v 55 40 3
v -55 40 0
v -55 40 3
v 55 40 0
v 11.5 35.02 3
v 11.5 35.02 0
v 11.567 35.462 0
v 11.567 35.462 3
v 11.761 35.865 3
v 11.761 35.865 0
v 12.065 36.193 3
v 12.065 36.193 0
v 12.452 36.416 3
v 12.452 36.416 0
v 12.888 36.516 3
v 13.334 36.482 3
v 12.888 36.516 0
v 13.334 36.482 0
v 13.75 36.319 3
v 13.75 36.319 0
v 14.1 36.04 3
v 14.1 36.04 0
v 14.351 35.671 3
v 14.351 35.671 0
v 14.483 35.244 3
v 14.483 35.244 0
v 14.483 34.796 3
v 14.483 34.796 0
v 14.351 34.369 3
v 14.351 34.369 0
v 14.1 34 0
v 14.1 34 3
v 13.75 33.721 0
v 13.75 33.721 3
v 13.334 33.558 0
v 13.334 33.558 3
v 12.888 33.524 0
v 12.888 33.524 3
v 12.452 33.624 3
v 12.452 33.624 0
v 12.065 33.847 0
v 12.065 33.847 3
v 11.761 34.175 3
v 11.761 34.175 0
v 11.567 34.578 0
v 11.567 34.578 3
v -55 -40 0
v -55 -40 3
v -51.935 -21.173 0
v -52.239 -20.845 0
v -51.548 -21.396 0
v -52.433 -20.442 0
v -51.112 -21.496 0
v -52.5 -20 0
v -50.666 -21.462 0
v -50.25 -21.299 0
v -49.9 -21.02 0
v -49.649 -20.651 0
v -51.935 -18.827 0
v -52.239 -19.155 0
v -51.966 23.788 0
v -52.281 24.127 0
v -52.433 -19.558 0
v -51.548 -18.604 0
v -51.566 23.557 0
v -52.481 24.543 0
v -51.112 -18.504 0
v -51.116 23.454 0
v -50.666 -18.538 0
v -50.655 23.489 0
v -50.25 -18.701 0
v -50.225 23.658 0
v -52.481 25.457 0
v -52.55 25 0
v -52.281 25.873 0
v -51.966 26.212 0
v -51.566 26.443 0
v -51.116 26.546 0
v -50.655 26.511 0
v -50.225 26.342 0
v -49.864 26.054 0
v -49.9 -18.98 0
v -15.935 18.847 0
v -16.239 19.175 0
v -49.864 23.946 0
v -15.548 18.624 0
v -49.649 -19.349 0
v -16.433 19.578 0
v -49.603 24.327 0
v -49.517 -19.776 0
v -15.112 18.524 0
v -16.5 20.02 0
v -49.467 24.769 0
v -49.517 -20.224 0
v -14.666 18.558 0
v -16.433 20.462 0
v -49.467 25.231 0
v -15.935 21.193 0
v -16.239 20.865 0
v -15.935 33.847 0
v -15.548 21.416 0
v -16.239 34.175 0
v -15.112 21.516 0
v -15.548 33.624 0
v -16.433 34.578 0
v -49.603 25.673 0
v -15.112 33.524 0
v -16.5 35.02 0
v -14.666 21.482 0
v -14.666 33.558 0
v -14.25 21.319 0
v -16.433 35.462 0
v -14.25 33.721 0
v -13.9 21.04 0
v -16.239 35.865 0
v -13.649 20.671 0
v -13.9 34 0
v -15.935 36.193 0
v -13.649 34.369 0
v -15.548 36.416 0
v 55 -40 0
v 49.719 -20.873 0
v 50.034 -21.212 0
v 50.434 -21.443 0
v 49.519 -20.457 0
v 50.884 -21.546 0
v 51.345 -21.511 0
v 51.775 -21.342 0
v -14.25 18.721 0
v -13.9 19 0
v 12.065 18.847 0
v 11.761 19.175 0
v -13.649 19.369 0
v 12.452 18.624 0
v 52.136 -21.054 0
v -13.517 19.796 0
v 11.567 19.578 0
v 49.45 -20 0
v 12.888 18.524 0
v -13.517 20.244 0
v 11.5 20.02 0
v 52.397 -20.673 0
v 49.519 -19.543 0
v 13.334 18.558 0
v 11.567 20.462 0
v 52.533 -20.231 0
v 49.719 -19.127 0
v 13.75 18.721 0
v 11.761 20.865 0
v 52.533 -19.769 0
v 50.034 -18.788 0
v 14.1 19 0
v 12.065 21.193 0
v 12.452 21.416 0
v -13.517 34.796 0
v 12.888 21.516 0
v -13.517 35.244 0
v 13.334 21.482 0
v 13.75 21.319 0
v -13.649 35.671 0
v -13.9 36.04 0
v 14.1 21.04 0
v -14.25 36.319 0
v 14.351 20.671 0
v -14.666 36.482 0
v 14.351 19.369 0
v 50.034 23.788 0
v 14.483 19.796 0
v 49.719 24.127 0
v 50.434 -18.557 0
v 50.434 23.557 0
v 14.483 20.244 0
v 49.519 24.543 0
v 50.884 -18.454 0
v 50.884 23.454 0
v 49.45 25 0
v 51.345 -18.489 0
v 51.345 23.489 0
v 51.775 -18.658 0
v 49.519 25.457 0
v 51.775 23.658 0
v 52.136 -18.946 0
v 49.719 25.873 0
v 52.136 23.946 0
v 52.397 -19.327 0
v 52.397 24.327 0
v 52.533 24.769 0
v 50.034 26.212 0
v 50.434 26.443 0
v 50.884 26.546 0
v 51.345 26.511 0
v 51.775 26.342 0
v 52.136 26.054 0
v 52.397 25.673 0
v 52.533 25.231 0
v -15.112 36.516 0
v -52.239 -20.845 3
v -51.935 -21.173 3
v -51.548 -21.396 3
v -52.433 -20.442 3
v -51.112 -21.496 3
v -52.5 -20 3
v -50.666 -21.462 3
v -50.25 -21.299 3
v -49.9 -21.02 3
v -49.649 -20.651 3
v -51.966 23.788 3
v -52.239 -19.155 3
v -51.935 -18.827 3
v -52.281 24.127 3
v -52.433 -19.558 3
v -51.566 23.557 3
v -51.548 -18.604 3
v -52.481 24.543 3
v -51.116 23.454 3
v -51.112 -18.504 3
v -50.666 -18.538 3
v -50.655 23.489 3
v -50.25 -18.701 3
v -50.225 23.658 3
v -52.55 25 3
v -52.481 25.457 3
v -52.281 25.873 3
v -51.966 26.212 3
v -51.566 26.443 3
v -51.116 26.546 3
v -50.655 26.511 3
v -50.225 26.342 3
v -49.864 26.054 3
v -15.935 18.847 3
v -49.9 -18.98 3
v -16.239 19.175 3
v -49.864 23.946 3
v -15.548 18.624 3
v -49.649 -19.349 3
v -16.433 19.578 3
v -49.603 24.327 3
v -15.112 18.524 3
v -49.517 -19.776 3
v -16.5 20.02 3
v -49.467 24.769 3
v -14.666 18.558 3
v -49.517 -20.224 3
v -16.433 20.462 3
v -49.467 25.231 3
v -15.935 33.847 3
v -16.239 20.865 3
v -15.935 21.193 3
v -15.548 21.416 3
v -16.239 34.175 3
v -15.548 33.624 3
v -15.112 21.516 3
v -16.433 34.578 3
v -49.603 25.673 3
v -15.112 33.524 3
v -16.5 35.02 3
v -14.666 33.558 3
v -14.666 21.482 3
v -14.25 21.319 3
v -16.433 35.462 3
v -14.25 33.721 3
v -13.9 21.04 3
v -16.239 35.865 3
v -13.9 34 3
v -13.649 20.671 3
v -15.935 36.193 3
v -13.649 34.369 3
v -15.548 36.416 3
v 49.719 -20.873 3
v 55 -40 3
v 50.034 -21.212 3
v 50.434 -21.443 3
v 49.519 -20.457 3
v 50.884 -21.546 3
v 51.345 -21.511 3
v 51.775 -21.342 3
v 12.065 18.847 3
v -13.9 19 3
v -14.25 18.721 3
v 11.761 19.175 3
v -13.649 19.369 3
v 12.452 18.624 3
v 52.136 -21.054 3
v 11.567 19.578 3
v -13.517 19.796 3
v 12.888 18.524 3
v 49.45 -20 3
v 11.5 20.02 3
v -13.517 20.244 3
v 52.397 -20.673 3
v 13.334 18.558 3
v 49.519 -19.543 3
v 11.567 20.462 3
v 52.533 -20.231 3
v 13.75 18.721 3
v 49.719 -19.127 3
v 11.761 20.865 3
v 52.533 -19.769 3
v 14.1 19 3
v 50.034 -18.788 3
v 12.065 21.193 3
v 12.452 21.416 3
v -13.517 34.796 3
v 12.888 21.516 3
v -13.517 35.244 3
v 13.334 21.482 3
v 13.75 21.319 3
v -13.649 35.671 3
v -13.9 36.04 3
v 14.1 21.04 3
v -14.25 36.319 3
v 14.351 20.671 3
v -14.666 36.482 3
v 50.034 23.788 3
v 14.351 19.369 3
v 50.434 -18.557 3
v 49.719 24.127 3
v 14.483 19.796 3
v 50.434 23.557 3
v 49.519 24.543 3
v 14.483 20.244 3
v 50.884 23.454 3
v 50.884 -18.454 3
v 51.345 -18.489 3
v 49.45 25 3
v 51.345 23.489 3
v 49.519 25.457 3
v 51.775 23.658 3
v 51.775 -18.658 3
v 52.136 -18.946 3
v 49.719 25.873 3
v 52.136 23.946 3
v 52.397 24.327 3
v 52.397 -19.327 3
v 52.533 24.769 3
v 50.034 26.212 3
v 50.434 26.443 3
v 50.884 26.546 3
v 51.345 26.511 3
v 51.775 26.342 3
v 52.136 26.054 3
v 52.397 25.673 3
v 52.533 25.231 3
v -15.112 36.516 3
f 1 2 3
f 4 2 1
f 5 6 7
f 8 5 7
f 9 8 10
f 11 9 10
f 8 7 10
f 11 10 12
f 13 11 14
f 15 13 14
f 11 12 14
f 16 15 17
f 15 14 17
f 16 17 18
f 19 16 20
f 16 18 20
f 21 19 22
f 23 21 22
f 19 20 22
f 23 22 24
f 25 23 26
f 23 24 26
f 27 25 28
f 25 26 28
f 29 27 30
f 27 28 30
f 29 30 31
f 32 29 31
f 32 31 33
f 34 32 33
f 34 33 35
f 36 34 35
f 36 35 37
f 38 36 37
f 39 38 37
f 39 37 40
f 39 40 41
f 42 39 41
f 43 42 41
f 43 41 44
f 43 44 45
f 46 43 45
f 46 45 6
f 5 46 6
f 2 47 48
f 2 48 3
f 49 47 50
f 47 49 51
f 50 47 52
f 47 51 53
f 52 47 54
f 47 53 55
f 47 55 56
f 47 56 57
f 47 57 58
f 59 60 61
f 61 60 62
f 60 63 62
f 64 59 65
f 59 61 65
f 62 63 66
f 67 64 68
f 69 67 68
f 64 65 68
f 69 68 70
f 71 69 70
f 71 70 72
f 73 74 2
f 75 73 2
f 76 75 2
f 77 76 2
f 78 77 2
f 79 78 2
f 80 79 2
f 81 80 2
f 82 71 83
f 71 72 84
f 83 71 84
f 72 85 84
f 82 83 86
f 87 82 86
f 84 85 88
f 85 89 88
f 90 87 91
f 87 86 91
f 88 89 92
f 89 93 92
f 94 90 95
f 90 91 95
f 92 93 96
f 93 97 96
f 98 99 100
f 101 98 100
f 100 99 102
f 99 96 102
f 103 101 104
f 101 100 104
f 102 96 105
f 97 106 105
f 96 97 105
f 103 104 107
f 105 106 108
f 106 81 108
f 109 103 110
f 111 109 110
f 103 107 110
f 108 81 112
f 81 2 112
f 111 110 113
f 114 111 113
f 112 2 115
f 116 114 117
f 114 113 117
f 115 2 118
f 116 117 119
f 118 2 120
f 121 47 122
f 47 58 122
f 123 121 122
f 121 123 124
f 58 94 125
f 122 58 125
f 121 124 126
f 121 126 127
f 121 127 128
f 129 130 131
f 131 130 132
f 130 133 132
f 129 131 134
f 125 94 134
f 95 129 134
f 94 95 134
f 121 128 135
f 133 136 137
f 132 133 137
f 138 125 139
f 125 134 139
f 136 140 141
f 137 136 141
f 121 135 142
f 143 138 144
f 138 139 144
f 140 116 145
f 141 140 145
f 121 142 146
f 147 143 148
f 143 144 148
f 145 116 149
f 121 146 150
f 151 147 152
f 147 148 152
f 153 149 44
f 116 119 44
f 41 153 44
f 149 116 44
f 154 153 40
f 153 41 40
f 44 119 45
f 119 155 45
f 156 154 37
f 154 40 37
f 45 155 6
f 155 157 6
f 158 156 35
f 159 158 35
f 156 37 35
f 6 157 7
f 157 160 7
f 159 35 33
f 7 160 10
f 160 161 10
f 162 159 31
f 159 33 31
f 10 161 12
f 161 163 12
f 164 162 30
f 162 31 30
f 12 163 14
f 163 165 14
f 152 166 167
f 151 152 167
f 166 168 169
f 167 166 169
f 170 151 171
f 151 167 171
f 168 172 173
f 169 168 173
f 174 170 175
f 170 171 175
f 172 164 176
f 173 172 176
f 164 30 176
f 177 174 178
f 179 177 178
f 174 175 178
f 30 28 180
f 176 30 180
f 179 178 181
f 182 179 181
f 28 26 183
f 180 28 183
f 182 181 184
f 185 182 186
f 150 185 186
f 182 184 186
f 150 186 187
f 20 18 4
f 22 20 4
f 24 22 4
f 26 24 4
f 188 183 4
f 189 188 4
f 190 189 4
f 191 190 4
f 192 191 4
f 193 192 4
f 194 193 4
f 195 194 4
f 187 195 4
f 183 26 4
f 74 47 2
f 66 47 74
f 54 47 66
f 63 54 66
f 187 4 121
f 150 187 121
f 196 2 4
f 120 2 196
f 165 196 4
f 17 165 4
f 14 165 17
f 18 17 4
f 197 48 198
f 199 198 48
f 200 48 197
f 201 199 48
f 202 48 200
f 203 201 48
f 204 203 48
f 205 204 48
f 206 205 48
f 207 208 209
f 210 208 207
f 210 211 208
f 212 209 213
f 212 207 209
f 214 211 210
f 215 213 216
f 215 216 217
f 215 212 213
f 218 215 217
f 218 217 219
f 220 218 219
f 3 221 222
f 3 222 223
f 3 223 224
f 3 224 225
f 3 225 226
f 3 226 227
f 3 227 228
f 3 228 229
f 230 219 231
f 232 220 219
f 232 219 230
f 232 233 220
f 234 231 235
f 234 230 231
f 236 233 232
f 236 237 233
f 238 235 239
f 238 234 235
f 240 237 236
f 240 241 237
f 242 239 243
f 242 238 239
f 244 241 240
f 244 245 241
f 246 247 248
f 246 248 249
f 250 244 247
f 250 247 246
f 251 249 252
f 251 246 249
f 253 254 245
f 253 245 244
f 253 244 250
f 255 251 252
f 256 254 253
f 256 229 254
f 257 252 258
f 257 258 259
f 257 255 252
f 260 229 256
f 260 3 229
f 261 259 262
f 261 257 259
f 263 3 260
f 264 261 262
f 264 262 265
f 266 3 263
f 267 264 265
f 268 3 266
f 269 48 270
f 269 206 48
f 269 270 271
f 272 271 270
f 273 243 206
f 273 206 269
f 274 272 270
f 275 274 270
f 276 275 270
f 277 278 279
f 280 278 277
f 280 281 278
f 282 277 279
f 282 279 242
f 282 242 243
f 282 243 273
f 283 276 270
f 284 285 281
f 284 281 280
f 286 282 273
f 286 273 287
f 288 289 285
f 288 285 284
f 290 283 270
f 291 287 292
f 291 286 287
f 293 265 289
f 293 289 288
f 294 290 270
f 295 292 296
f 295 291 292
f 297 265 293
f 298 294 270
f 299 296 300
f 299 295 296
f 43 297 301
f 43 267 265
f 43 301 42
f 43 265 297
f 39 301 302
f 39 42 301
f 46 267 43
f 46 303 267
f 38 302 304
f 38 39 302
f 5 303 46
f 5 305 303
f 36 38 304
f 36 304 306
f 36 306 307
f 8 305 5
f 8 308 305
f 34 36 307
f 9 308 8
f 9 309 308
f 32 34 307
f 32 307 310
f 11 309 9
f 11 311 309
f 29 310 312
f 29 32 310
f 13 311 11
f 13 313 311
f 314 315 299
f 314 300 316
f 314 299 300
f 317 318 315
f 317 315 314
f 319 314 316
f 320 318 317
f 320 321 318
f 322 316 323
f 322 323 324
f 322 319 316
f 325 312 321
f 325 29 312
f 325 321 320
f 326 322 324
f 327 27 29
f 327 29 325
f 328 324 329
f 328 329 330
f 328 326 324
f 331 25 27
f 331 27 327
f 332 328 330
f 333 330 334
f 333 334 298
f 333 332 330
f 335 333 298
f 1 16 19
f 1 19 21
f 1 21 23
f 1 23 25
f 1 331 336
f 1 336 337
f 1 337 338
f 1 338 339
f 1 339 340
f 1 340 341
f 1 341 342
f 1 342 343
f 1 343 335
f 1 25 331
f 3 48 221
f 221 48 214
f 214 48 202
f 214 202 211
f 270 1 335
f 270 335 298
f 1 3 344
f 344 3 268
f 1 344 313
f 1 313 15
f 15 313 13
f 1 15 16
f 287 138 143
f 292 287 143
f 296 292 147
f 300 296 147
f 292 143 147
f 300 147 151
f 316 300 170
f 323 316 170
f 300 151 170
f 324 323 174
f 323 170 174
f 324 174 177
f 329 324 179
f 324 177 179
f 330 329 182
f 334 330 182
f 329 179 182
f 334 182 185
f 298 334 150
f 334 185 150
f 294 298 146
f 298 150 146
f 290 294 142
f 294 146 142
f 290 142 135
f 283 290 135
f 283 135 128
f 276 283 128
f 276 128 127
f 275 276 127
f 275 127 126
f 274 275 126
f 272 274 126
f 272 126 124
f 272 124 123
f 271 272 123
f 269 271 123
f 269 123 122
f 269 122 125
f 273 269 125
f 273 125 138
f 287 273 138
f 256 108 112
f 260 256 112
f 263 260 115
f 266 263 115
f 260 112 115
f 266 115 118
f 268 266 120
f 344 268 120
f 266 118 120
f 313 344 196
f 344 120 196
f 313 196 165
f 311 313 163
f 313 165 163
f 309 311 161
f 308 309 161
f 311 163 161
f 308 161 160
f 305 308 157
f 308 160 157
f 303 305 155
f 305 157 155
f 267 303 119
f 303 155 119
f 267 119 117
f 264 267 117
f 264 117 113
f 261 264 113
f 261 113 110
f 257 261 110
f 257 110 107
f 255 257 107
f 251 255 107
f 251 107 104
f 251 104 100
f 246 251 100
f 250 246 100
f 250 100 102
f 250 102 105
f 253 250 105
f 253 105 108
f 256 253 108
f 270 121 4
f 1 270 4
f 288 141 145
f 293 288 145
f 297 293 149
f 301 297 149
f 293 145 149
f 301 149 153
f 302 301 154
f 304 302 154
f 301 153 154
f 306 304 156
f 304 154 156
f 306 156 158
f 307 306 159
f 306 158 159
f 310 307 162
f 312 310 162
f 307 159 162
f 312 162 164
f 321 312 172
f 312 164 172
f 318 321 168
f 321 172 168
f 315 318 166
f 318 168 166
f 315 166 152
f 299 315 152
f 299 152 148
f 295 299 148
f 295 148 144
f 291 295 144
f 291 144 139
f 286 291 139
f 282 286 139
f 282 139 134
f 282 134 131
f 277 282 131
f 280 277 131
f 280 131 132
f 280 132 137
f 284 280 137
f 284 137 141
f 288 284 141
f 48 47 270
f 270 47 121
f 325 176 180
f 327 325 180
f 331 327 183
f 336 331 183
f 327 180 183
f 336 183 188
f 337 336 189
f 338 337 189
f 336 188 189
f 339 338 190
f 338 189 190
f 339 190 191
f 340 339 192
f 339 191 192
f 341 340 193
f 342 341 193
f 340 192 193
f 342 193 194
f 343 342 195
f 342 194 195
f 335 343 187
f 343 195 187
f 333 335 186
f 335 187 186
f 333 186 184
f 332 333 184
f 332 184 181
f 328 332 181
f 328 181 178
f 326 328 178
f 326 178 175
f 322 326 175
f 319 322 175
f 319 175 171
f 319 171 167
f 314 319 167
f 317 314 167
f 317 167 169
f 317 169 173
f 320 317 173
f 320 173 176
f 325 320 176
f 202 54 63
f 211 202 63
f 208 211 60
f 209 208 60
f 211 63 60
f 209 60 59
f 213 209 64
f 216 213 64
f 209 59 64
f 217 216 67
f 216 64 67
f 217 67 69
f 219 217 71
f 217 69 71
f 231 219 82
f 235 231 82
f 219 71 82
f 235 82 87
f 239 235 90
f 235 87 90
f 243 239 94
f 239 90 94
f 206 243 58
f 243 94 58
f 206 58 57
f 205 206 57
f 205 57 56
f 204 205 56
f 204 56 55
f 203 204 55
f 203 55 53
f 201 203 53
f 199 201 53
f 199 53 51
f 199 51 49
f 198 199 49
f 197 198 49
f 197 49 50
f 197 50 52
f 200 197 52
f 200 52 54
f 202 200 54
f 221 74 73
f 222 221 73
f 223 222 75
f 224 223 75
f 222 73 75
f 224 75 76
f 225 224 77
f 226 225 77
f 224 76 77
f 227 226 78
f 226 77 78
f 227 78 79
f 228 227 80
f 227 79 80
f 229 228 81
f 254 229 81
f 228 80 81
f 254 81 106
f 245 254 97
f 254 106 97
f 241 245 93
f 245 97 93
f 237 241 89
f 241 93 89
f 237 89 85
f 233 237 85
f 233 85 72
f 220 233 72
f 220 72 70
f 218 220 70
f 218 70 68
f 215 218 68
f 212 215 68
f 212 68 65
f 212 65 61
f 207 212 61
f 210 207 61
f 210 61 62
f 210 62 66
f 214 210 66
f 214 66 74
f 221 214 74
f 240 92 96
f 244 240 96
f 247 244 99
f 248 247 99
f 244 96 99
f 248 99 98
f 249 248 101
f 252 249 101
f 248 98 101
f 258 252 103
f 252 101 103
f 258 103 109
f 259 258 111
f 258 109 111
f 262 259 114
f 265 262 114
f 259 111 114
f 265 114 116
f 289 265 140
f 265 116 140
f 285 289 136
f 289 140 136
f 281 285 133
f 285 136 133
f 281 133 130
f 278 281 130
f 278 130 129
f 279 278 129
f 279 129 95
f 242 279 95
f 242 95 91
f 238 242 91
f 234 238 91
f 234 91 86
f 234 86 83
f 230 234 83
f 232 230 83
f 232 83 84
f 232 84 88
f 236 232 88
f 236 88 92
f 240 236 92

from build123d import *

# Parameters (mm, degrees)
SKETCH_1_W          = 110
SKETCH_1_H          = 80
EXTRUDE_1_DEPTH     = 3
SKETCH_2_R          = 1.5
CUT_EXTRUDE_1_DEPTH = 10
SKETCH_3_R          = 1.55
SKETCH_3_R_2        = 1.5
CUT_EXTRUDE_2_DEPTH = 10


with BuildPart() as part:
    # 草图1 → 凸台-拉伸1 (new body)
    with BuildSketch(Plane.XY):
        Rectangle(SKETCH_1_W, SKETCH_1_H)
    extrude(amount=EXTRUDE_1_DEPTH)

    # 草图2 → 切除-拉伸1 (cut)
    with BuildSketch(Plane(origin=(0, 0, 0), x_dir=(-1, 0, 0), z_dir=(0, 0, -1))):
        with Locations((-13, 20.02)):
            Circle(SKETCH_2_R)
        with Locations((-13, 35.02)):
            Circle(SKETCH_2_R)
        with Locations((15, 20.02)):
            Circle(SKETCH_2_R)
        with Locations((15, 35.02)):
            Circle(SKETCH_2_R)
    extrude(amount=-CUT_EXTRUDE_1_DEPTH, mode=Mode.SUBTRACT)

    # 草图3 → 切除-拉伸2 (cut)
    with BuildSketch(Plane(origin=(0, 0, 0), x_dir=(-1, 0, 0), z_dir=(0, 0, -1))):
        with Locations((-51, -20)):
            Circle(SKETCH_3_R)
        with Locations((-51, 25)):
            Circle(SKETCH_3_R)
        with Locations((51, -20)):
            Circle(SKETCH_3_R_2)
        with Locations((51, 25)):
            Circle(SKETCH_3_R)
    extrude(amount=-CUT_EXTRUDE_2_DEPTH, mode=Mode.SUBTRACT)


solid = part.part
